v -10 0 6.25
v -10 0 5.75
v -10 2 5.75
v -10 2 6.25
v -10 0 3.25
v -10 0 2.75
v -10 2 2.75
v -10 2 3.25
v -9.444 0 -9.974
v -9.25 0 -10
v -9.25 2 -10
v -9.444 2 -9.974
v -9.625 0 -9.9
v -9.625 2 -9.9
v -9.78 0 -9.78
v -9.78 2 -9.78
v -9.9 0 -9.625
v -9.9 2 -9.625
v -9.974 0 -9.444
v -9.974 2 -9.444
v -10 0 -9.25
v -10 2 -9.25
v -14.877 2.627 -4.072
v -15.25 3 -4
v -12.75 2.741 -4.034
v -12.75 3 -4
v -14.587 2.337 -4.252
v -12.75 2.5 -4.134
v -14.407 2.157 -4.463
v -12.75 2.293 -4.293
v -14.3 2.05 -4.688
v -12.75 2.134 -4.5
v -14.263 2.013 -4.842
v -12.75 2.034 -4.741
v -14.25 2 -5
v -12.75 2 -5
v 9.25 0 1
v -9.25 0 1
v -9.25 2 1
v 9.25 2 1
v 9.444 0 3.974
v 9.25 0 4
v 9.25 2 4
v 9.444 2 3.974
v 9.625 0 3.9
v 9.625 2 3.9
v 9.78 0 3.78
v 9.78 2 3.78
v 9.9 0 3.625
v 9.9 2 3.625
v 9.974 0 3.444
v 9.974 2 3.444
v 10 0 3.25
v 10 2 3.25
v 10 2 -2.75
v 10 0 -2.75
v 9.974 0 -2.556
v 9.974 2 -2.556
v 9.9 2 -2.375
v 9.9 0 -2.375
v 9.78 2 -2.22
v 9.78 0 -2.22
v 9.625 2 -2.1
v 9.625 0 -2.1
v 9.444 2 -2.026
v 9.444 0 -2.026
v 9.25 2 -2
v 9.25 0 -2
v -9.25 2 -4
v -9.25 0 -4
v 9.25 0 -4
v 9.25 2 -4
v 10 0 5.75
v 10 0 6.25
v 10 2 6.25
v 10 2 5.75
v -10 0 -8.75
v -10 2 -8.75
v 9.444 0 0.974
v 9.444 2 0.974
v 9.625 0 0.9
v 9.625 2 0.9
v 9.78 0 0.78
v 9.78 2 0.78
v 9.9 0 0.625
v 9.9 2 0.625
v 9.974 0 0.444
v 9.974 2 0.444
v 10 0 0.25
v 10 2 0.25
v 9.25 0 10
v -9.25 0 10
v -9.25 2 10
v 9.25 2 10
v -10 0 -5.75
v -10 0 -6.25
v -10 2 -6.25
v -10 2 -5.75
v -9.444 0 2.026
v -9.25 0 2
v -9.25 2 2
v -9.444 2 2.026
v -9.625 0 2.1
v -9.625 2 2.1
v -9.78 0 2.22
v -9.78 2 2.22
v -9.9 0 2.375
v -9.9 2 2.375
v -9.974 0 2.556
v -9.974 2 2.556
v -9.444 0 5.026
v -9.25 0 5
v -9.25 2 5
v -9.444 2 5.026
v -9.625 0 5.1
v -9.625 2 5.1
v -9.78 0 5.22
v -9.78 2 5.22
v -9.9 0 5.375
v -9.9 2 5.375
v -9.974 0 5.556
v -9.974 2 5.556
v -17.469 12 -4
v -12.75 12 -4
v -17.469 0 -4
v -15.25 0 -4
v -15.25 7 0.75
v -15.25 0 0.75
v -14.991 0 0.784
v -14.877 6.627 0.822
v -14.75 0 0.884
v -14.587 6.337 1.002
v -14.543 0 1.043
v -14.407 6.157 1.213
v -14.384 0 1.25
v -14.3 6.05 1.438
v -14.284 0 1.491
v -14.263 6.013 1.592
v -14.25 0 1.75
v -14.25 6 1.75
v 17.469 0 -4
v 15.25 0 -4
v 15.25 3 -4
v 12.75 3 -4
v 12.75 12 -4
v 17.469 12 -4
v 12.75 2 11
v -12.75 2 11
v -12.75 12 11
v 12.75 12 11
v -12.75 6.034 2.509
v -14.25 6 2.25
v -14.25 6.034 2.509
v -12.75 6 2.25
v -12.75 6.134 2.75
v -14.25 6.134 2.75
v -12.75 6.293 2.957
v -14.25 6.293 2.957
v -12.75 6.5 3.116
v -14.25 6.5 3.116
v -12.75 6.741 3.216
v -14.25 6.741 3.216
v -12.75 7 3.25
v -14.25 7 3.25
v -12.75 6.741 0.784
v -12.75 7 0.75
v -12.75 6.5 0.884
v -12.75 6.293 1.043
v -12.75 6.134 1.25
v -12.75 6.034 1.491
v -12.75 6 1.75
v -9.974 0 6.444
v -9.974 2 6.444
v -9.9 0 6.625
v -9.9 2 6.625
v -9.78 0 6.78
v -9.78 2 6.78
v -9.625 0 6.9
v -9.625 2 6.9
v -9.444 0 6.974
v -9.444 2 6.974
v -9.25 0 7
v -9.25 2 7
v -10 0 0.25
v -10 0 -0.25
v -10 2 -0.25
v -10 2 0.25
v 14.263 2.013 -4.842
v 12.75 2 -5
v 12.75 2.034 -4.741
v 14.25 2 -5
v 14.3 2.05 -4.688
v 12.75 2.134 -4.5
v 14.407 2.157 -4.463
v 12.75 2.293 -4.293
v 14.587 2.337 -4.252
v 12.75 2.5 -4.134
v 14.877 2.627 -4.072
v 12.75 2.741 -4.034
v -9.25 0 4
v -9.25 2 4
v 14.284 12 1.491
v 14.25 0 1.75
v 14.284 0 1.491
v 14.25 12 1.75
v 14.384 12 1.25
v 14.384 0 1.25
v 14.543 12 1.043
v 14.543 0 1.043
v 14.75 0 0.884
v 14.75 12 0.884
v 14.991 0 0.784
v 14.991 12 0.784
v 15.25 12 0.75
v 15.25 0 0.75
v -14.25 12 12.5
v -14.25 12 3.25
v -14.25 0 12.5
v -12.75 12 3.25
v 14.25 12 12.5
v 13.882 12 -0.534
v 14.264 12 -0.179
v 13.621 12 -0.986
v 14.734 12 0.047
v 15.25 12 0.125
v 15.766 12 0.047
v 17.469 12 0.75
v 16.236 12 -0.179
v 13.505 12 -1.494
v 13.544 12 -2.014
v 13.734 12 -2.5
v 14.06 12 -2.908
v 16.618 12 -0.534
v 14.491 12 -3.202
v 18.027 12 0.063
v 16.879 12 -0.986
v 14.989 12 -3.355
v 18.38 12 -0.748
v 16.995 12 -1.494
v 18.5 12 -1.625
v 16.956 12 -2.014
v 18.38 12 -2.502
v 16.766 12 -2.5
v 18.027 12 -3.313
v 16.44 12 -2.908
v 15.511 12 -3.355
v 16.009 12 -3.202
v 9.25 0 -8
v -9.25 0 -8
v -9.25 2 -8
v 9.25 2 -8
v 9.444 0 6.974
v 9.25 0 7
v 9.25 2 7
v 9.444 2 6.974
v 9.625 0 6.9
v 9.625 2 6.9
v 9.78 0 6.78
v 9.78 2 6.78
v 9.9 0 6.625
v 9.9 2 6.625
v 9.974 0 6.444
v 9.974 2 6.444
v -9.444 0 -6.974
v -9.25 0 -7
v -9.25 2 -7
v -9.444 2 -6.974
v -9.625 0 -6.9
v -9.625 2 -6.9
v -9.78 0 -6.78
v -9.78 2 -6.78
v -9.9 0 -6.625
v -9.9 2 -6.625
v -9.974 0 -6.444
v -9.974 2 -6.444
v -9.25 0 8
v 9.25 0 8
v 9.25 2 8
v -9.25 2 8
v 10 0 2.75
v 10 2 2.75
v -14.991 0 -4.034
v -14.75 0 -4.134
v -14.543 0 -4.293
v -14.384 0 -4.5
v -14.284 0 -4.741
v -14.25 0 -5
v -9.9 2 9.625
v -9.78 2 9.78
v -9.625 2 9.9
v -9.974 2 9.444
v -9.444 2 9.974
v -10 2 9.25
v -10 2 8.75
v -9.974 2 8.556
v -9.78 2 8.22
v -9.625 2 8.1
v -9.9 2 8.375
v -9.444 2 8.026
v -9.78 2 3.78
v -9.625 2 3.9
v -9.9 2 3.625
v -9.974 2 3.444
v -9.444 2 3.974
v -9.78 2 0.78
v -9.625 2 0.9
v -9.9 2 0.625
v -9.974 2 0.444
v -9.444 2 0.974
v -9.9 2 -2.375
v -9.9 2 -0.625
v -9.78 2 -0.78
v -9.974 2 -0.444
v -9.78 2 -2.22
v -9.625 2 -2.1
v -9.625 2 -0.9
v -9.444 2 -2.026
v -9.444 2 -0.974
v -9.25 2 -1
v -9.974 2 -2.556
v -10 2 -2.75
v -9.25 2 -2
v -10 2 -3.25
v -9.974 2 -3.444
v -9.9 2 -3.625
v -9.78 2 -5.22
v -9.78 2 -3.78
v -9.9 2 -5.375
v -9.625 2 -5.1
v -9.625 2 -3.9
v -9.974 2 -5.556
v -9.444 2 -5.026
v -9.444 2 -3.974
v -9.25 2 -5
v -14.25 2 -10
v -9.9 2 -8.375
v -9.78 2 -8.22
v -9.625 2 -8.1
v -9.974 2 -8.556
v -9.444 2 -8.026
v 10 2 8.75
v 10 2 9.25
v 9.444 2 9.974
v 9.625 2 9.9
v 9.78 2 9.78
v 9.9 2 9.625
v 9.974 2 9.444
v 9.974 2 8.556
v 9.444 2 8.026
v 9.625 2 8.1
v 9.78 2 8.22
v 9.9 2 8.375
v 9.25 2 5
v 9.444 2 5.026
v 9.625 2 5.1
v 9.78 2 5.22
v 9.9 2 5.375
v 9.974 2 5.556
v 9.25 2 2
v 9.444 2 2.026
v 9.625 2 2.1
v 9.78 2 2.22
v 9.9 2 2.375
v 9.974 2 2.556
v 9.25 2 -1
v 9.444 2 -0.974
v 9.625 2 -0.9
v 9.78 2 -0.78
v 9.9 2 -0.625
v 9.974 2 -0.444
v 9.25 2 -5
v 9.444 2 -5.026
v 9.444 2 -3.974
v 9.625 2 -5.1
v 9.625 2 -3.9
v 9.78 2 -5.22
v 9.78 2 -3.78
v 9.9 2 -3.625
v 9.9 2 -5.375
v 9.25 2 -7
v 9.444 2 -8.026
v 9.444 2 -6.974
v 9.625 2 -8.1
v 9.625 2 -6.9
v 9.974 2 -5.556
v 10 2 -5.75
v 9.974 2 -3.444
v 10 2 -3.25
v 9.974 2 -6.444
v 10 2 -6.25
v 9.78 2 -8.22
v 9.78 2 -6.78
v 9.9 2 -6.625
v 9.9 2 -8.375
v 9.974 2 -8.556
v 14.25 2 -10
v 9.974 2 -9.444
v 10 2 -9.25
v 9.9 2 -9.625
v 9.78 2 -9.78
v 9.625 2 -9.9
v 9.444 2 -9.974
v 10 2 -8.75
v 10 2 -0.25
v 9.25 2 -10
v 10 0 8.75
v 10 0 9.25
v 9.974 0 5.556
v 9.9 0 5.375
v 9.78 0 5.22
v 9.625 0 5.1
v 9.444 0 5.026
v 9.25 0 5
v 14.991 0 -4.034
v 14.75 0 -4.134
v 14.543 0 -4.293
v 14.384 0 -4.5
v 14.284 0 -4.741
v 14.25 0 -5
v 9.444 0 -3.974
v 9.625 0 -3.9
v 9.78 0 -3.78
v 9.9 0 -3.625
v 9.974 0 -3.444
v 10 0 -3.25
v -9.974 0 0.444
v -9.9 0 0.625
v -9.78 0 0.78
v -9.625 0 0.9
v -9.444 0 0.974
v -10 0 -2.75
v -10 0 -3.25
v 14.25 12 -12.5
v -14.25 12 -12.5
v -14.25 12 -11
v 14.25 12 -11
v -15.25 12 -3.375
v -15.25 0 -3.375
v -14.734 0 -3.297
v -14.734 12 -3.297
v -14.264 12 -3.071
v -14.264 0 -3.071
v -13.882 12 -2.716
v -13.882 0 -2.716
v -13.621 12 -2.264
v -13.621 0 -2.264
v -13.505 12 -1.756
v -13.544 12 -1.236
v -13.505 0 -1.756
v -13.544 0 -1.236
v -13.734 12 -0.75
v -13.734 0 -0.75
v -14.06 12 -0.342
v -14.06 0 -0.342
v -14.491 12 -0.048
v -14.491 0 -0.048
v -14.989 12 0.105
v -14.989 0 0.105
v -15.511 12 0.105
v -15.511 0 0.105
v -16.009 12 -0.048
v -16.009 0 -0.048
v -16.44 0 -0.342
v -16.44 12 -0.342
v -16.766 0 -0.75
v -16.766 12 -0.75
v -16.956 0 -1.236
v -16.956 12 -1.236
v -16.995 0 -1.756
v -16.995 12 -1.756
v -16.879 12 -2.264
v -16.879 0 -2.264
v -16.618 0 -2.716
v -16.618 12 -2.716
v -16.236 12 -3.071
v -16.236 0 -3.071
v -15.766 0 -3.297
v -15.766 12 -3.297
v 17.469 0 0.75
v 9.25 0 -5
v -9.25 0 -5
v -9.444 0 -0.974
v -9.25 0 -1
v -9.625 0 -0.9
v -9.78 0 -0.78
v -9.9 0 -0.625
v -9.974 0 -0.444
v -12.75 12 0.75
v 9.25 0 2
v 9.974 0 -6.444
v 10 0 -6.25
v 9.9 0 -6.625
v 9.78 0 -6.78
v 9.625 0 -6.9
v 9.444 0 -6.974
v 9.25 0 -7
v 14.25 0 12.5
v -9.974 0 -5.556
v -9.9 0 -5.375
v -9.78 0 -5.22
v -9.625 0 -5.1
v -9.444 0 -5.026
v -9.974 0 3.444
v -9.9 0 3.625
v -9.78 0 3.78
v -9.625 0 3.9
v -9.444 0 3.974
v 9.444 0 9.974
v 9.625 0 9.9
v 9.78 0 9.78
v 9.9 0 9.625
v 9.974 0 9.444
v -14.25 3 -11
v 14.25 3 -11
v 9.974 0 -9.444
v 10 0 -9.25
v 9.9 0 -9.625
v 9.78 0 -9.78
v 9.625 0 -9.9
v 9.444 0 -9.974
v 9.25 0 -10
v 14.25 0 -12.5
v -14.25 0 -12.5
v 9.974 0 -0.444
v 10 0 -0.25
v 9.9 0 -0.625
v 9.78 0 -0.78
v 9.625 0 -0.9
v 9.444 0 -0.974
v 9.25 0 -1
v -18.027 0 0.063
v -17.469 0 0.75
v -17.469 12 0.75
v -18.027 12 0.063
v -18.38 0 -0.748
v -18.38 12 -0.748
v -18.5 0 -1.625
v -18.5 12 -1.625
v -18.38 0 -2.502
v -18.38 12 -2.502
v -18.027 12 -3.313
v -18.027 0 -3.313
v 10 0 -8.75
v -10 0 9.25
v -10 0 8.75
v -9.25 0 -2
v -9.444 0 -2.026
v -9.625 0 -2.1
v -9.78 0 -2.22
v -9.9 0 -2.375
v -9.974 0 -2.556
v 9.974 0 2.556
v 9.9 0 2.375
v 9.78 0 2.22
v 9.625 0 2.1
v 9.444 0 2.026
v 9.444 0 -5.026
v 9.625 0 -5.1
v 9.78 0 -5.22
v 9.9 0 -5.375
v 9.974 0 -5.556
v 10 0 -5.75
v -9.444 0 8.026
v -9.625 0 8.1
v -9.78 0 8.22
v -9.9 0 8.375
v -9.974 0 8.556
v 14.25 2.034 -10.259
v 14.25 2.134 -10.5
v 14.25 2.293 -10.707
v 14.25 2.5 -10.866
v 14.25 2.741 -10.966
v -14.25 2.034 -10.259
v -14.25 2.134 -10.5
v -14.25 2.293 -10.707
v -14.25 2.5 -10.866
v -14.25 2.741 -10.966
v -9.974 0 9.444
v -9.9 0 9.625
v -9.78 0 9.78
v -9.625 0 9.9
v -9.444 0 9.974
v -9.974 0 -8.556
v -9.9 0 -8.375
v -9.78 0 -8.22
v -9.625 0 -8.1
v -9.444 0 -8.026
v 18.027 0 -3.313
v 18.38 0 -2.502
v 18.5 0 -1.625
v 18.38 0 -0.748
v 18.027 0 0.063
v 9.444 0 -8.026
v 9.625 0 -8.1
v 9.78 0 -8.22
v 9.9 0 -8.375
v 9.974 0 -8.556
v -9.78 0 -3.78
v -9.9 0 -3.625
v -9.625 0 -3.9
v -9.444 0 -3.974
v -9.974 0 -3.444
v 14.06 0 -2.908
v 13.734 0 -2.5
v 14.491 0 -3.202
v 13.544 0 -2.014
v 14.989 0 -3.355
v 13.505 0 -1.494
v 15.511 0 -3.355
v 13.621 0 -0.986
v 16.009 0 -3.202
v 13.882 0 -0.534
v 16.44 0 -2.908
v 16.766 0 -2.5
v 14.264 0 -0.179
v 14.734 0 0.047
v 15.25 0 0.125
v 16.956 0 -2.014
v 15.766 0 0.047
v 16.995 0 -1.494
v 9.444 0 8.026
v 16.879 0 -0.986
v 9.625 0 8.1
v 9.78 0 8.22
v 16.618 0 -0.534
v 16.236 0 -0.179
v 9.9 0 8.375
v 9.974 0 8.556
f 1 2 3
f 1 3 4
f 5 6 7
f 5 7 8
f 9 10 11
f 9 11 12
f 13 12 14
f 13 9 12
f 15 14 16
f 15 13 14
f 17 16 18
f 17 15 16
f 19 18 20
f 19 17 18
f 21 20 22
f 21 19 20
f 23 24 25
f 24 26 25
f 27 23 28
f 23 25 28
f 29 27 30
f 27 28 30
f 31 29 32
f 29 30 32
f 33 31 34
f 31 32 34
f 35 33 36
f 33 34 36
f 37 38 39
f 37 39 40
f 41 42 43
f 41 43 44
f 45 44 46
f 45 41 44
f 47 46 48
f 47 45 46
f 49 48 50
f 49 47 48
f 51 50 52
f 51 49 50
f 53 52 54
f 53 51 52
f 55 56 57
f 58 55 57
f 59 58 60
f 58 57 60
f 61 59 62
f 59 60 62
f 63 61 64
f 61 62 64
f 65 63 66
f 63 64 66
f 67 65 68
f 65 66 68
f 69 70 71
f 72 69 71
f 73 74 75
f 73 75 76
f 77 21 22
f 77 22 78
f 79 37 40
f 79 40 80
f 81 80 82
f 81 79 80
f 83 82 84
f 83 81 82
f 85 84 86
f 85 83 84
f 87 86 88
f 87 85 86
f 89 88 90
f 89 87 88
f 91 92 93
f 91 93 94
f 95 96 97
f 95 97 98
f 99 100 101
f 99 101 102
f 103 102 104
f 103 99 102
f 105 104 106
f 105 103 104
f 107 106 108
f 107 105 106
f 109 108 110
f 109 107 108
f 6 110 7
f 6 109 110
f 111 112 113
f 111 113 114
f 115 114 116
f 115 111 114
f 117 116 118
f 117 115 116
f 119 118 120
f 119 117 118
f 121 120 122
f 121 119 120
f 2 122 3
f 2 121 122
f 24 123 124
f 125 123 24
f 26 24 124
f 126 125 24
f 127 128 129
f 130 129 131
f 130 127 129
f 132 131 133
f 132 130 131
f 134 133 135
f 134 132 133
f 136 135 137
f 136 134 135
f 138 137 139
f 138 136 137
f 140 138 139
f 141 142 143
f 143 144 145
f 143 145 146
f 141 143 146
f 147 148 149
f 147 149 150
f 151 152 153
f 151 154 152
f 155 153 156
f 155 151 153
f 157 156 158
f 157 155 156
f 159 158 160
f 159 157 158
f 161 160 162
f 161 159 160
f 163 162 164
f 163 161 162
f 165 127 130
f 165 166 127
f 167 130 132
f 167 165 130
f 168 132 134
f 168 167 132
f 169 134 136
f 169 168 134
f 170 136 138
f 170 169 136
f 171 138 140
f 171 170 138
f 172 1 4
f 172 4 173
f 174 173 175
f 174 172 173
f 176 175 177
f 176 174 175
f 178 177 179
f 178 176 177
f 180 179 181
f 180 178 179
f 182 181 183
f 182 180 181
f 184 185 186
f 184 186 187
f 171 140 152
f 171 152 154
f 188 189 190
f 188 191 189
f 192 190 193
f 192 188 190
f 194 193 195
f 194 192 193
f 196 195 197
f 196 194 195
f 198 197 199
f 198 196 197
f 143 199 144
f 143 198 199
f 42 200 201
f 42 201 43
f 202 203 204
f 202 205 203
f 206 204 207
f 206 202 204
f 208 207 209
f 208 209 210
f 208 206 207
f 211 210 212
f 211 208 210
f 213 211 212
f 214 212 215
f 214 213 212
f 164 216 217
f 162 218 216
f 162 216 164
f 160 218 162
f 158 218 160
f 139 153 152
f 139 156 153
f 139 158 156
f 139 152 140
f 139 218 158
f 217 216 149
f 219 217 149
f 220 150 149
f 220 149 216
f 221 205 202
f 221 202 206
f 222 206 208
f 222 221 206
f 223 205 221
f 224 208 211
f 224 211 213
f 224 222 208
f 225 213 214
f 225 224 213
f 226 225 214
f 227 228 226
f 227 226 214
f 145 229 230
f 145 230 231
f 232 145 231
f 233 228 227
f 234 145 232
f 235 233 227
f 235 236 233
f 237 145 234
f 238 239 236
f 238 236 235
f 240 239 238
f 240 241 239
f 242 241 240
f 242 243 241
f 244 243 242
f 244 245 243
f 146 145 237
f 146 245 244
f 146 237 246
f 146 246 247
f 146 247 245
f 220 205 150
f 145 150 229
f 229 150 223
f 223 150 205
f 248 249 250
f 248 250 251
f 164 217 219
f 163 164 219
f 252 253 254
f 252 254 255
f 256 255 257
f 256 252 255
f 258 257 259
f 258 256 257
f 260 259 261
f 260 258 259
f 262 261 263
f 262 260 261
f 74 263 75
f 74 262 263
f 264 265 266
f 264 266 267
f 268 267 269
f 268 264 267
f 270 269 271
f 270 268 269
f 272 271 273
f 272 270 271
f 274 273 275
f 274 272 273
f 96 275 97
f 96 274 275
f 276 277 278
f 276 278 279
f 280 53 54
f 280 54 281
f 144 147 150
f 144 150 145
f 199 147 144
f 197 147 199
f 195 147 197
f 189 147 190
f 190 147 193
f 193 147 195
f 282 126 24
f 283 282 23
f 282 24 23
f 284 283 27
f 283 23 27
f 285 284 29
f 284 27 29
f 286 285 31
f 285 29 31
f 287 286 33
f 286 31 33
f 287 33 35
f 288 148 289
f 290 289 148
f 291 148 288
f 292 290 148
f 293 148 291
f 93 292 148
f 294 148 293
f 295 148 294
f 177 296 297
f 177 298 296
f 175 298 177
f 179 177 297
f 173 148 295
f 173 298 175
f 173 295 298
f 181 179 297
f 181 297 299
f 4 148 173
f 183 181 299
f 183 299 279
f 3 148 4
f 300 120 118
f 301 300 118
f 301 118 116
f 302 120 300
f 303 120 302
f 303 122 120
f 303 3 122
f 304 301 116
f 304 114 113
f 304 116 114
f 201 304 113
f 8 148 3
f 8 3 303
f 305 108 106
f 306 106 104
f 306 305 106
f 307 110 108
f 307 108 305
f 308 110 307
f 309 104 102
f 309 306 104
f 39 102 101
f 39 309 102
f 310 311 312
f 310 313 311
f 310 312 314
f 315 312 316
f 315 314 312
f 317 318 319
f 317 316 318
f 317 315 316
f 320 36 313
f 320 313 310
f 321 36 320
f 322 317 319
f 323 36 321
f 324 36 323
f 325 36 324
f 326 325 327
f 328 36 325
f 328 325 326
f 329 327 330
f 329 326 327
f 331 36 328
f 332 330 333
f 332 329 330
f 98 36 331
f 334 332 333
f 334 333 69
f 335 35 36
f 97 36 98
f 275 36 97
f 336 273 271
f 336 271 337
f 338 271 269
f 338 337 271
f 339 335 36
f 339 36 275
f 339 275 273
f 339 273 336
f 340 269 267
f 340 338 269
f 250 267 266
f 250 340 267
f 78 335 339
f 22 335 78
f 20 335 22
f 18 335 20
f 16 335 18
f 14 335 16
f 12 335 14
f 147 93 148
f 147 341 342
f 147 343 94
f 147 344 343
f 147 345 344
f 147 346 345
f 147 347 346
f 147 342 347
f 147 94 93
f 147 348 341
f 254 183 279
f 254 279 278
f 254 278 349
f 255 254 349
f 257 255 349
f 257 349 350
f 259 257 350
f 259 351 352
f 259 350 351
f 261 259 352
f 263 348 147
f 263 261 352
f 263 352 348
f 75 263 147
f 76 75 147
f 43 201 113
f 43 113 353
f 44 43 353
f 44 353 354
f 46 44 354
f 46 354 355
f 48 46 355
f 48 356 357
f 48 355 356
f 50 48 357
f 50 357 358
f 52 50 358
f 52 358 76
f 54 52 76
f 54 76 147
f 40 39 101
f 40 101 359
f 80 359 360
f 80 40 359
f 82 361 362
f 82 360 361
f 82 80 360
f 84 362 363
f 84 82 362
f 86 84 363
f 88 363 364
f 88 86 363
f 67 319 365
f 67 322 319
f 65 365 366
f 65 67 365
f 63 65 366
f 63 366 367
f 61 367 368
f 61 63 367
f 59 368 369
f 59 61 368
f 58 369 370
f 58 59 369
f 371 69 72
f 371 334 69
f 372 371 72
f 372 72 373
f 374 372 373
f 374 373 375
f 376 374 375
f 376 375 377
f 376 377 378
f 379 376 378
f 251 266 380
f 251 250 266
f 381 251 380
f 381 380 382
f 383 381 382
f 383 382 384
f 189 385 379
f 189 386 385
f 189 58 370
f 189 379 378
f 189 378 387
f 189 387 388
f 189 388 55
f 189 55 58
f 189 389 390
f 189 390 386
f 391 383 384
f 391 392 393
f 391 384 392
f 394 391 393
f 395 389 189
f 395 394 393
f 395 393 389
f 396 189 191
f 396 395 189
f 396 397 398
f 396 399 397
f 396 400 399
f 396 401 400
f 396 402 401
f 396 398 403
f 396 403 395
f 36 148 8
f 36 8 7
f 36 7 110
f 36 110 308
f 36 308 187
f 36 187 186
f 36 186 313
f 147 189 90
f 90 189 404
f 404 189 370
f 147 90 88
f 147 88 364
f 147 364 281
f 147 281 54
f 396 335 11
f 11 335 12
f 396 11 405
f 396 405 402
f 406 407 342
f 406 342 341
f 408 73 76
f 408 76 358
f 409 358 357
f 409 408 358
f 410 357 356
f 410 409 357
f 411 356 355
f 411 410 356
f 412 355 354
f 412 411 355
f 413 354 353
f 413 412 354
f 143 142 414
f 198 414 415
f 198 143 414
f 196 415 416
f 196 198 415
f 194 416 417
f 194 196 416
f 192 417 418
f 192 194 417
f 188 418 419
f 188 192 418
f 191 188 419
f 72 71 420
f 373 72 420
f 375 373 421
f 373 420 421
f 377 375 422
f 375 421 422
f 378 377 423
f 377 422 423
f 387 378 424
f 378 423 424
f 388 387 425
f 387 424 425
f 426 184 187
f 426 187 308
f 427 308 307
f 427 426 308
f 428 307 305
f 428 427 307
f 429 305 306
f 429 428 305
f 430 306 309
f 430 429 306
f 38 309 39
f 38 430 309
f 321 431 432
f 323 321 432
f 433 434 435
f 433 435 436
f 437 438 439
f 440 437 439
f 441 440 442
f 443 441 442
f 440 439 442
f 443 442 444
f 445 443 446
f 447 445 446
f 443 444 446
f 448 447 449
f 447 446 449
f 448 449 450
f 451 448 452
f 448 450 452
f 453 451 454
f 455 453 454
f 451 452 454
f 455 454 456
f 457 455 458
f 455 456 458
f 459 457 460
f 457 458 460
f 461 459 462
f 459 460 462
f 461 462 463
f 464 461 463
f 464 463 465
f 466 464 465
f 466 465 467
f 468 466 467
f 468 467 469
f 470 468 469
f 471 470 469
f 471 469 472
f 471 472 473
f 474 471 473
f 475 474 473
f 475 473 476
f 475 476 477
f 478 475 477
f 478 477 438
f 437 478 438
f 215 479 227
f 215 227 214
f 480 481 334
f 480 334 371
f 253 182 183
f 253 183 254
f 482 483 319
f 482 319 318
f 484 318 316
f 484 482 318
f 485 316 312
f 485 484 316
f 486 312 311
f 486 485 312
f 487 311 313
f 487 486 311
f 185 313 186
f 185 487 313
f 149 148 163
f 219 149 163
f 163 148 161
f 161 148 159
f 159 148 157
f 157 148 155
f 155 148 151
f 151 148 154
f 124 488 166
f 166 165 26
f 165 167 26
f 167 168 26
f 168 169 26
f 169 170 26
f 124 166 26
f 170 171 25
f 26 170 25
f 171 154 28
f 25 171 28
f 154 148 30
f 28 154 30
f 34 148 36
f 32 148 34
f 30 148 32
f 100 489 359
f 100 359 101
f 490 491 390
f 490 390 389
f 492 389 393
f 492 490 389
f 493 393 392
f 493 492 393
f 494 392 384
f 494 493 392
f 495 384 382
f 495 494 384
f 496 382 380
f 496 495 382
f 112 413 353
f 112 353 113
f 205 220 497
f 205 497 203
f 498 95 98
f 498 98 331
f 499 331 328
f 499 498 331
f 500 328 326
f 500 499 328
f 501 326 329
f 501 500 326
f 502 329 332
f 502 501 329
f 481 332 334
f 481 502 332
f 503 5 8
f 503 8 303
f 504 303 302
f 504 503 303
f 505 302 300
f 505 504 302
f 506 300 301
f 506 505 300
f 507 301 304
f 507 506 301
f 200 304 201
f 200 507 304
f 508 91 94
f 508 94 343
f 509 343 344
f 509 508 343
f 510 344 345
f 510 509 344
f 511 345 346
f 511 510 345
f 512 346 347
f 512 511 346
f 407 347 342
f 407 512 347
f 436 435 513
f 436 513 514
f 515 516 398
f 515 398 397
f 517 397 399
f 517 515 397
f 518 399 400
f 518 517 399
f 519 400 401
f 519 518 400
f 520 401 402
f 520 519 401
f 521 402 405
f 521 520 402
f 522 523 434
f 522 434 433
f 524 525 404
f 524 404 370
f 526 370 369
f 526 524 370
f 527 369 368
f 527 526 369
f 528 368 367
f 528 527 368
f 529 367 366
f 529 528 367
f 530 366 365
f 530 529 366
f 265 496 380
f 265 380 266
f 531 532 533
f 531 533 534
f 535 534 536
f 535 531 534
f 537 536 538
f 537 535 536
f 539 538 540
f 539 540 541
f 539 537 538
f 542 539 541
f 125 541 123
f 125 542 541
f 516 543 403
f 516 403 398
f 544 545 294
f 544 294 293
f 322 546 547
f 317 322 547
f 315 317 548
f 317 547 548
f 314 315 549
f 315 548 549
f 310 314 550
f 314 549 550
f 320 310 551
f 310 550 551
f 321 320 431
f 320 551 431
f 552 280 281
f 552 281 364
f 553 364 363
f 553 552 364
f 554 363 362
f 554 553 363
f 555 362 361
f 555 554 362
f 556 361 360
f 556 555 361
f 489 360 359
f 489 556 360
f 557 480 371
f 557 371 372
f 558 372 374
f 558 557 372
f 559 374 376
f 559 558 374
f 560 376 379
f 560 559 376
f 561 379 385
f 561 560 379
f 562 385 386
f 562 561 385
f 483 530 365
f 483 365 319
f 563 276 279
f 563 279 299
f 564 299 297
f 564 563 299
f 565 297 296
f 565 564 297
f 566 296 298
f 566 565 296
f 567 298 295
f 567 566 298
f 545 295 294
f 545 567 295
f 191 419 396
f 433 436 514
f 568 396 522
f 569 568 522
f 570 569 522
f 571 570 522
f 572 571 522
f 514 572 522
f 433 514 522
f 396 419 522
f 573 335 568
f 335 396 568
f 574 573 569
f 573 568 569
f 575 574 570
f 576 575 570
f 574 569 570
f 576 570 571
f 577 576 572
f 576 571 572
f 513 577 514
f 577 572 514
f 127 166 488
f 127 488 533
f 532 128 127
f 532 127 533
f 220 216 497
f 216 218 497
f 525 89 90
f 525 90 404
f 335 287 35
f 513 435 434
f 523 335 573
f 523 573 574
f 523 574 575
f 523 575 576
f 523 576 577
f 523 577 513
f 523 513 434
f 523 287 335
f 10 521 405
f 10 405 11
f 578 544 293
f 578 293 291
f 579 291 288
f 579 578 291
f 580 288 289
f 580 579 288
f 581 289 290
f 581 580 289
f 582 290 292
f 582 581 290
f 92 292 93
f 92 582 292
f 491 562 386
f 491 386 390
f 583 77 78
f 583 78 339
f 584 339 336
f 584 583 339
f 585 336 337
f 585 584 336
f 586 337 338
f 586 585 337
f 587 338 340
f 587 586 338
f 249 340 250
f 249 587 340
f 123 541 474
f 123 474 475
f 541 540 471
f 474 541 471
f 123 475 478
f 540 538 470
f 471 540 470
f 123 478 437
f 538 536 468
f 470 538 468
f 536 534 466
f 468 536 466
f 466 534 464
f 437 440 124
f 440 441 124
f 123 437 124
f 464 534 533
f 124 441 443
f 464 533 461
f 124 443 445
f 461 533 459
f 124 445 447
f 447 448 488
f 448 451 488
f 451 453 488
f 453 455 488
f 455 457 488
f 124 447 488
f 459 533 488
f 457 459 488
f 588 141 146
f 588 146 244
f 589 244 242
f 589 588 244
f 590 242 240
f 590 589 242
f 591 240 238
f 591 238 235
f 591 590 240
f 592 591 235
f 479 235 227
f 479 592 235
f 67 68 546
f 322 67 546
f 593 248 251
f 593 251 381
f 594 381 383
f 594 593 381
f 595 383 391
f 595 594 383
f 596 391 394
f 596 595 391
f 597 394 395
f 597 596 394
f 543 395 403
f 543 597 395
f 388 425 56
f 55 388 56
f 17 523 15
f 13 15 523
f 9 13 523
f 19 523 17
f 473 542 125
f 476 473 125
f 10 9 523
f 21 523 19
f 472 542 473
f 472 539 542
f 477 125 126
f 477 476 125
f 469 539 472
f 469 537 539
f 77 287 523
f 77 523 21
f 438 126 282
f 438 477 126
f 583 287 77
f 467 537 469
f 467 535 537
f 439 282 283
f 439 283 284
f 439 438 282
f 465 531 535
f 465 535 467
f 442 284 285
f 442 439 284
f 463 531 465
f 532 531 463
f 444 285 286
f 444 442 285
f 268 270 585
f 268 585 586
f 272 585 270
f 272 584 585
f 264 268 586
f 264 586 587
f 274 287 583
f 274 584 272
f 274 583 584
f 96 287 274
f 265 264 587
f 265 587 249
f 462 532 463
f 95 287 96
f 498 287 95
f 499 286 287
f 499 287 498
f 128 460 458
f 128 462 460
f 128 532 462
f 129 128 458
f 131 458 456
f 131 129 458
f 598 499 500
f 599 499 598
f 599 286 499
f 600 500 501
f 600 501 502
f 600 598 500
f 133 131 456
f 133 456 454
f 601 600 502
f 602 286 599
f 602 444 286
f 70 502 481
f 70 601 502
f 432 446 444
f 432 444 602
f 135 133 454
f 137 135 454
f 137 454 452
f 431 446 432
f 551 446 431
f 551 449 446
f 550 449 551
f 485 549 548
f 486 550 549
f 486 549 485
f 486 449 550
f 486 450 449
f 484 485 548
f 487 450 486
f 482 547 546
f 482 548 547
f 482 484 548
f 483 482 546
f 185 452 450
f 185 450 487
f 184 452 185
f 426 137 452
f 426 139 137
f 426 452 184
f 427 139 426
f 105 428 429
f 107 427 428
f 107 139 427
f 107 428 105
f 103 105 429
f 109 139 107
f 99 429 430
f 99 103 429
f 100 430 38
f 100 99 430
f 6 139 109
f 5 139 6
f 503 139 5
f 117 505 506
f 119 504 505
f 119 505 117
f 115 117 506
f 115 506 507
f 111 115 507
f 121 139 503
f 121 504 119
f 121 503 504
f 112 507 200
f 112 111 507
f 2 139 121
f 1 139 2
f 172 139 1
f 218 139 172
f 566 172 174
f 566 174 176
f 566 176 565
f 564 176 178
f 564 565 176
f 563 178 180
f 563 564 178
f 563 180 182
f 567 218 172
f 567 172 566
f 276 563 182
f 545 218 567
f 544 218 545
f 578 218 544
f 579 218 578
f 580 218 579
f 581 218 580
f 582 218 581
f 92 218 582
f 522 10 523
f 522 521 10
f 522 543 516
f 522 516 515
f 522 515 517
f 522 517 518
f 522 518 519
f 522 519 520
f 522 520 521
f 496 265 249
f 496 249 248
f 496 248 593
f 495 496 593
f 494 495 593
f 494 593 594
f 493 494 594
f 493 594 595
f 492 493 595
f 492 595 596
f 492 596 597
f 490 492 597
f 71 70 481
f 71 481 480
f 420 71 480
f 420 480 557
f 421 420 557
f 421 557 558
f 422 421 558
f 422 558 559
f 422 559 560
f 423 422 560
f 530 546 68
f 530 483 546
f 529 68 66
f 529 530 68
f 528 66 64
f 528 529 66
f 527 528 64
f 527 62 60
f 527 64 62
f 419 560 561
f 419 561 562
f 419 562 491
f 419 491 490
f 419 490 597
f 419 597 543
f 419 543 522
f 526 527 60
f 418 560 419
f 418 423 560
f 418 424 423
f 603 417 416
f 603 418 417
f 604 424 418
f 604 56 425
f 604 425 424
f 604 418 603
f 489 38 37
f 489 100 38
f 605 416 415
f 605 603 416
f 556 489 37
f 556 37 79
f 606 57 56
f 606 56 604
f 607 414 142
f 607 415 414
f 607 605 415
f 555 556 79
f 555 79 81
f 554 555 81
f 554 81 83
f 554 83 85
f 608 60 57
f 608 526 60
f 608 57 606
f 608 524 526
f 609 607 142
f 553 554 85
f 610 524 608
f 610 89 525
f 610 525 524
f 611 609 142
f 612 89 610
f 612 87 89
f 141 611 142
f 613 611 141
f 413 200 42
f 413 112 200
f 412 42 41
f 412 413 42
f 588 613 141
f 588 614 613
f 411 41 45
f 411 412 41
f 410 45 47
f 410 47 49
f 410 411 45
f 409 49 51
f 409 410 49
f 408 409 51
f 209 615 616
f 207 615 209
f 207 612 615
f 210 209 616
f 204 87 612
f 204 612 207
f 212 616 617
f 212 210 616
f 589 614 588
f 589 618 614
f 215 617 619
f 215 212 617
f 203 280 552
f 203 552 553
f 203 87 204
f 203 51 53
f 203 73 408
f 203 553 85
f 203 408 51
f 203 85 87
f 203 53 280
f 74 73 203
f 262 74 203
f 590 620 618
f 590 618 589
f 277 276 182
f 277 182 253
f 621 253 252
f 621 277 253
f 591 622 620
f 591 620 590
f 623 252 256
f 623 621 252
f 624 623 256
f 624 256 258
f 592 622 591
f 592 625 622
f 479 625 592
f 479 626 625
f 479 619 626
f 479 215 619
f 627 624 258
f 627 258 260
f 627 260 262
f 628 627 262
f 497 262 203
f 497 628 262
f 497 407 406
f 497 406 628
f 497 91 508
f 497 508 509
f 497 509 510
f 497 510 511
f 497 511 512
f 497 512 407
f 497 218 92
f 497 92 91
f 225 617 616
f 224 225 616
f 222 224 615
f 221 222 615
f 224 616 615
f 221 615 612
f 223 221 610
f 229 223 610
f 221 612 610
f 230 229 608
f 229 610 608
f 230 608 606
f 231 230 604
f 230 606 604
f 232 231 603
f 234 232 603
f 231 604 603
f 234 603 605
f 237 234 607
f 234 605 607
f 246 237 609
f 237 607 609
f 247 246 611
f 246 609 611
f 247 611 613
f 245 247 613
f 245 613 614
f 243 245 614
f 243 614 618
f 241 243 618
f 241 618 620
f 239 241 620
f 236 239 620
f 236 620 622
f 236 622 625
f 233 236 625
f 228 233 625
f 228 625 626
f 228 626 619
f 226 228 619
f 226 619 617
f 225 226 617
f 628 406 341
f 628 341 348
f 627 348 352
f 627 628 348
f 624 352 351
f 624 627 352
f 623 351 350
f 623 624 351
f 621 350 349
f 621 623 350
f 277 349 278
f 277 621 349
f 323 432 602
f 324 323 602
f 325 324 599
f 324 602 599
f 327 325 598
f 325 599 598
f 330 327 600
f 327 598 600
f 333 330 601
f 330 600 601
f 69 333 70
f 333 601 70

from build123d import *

# Parameters (mm, degrees)
SKETCH1_W           = 28.5
SKETCH1_H           = 25
BOSS_EXTRUDE1_DEPTH = 2
SKETCH2_W           = 28.5
SKETCH2_H           = 25
SKETCH2_W_2         = 25.5
SKETCH2_H_2         = 22
BOSS_EXTRUDE2_DEPTH = 10
SKETCH3_W           = 1.5
SKETCH3_H           = 7
CUT_EXTRUDE1_DEPTH  = 10
SKETCH4_W           = 1.5
SKETCH4_H           = 2.5
CUT_EXTRUDE2_DEPTH  = 6
BOSS_EXTRUDE3_DEPTH = 12
CUT_EXTRUDE3_REACH  = 27.348
SKETCH6_R           = 1.75
FILLET1_R           = 1


with BuildPart() as part:
    # Sketch1 → Boss-Extrude1 (new body)
    with BuildSketch(Plane(origin=(0, 0, 0), x_dir=(1, 0, 0), z_dir=(0, 1, 0))):
        Rectangle(SKETCH1_W, SKETCH1_H)
        with BuildLine():
            Line((-9.25, 5), (9.25, 5))
            ThreePointArc((9.25, 5), (9.780330086, 5.219669914), (10, 5.75))
            Line((10, 5.75), (10, 6.25))
            ThreePointArc((10, 6.25), (9.780330086, 6.780330086), (9.25, 7))
            Line((9.25, 7), (-9.25, 7))
            ThreePointArc((-9.25, 7), (-9.780330086, 6.780330086), (-10, 6.25))
            Line((-10, 6.25), (-10, 5.75))
            ThreePointArc((-10, 5.75), (-9.780330086, 5.219669914), (-9.25, 5))
        make_face(mode=Mode.SUBTRACT)
        with BuildLine():
            Line((-9.25, 4), (9.25, 4))
            ThreePointArc((9.25, 4), (9.780330086, 3.780330086), (10, 3.25))
            Line((10, 3.25), (10, 2.75))
            ThreePointArc((10, 2.75), (9.780330086, 2.219669914), (9.25, 2))
            Line((9.25, 2), (-9.25, 2))
            ThreePointArc((-9.25, 2), (-9.780330086, 2.219669914), (-10, 2.75))
            Line((-10, 2.75), (-10, 3.25))
            ThreePointArc((-10, 3.25), (-9.780330086, 3.780330086), (-9.25, 4))
        make_face(mode=Mode.SUBTRACT)
        with BuildLine():
            Line((-9.25, 8), (9.25, 8))
            ThreePointArc((9.25, 8), (9.780330086, 8.219669914), (10, 8.75))
            Line((10, 8.75), (10, 9.25))
            ThreePointArc((10, 9.25), (9.780330086, 9.780330086), (9.25, 10))
            Line((9.25, 10), (-9.25, 10))
            ThreePointArc((-9.25, 10), (-9.780330086, 9.780330086), (-10, 9.25))
            Line((-10, 9.25), (-10, 8.75))
            ThreePointArc((-10, 8.75), (-9.780330086, 8.219669914), (-9.25, 8))
        make_face(mode=Mode.SUBTRACT)
        with BuildLine():
            Line((10, -9.25), (10, -8.75))
            ThreePointArc((10, -8.75), (9.780330086, -8.219669914), (9.25, -8))
            Line((9.25, -8), (-9.25, -8))
            ThreePointArc((-9.25, -8), (-9.780330086, -8.219669914), (-10, -8.75))
            Line((-10, -8.75), (-10, -9.25))
            ThreePointArc((-10, -9.25), (-9.780330086, -9.780330086), (-9.25, -10))
            Line((-9.25, -10), (9.25, -10))
            ThreePointArc((9.25, -10), (9.780330086, -9.780330086), (10, -9.25))
        make_face(mode=Mode.SUBTRACT)
        with BuildLine():
            Line((10, -6.25), (10, -5.75))
            ThreePointArc((10, -5.75), (9.780330086, -5.219669914), (9.25, -5))
            Line((9.25, -5), (-9.25, -5))
            ThreePointArc((-9.25, -5), (-9.780330086, -5.219669914), (-10, -5.75))
            Line((-10, -5.75), (-10, -6.25))
            ThreePointArc((-10, -6.25), (-9.780330086, -6.780330086), (-9.25, -7))
            Line((-9.25, -7), (9.25, -7))
            ThreePointArc((9.25, -7), (9.780330086, -6.780330086), (10, -6.25))
        make_face(mode=Mode.SUBTRACT)
        with BuildLine():
            Line((10, -3.25), (10, -2.75))
            ThreePointArc((10, -2.75), (9.780330086, -2.219669914), (9.25, -2))
            Line((9.25, -2), (-9.25, -2))
            ThreePointArc((-9.25, -2), (-9.780330086, -2.219669914), (-10, -2.75))
            Line((-10, -2.75), (-10, -3.25))
            ThreePointArc((-10, -3.25), (-9.780330086, -3.780330086), (-9.25, -4))
            Line((-9.25, -4), (9.25, -4))
            ThreePointArc((9.25, -4), (9.780330086, -3.780330086), (10, -3.25))
        make_face(mode=Mode.SUBTRACT)
        with BuildLine():
            Line((-10, 0.25), (-10, -0.25))
            ThreePointArc((-10, -0.25), (-9.780330086, -0.780330086), (-9.25, -1))
            Line((-9.25, -1), (9.25, -1))
            ThreePointArc((9.25, -1), (9.780330086, -0.780330086), (10, -0.25))
            Line((10, -0.25), (10, 0.25))
            ThreePointArc((10, 0.25), (9.780330086, 0.780330086), (9.25, 1))
            Line((9.25, 1), (-9.25, 1))
            ThreePointArc((-9.25, 1), (-9.780330086, 0.780330086), (-10, 0.25))
        make_face(mode=Mode.SUBTRACT)
    extrude(amount=BOSS_EXTRUDE1_DEPTH)

    # Sketch2 → Boss-Extrude2 (add)
    with BuildSketch(Plane(origin=(0, 2, 0), x_dir=(1, 0, 0), z_dir=(0, 1, 0))):
        Rectangle(SKETCH2_W, SKETCH2_H)
        Rectangle(SKETCH2_W_2, SKETCH2_H_2, mode=Mode.SUBTRACT)
    extrude(amount=BOSS_EXTRUDE2_DEPTH)

    # Sketch3 → Cut-Extrude1 (cut)
    with BuildSketch(Plane(origin=(0, 12, 0), x_dir=(1, 0, 0), z_dir=(0, 1, 0))):
        with Locations((-13.5, 7.5)):
            Rectangle(SKETCH3_W, SKETCH3_H)
        with Locations((13.5, 7.5)):
            Rectangle(SKETCH3_W, SKETCH3_H)
    extrude(amount=-CUT_EXTRUDE1_DEPTH, mode=Mode.SUBTRACT)

    # Sketch4 → Cut-Extrude2 (cut)
    with BuildSketch(Plane(origin=(0, 12, 0), x_dir=(1, 0, 0), z_dir=(0, 1, 0))):
        with Locations((-13.5, -2)):
            Rectangle(SKETCH4_W, SKETCH4_H)
    extrude(amount=-CUT_EXTRUDE2_DEPTH, mode=Mode.SUBTRACT)

    # Sketch5 → Boss-Extrude3 (add)
    with BuildSketch(Plane.XZ):
        with BuildLine():
            Line((-17.468529919, -4), (-14.25, -4))
            Line((-14.25, -4), (-14.25, 0.75))
            Line((-14.25, 0.75), (-17.468529919, 0.75))
            ThreePointArc((-17.468529919, 0.75), (-18.5, -1.625), (-17.468529919, -4))
        make_face()
        with BuildLine():
            Line((14.25, 0.75), (14.25, -4))
            Line((14.25, -4), (17.468529919, -4))
            ThreePointArc((17.468529919, -4), (18.5, -1.625), (17.468529919, 0.75))
            Line((17.468529919, 0.75), (14.25, 0.75))
        make_face()
    extrude(amount=-BOSS_EXTRUDE3_DEPTH)

    # Sketch6 → Cut-Extrude3 (cut, up to next)
    with BuildSketch(Plane.XZ, mode=Mode.PRIVATE) as cut_extrude3_sk1:
        with Locations(Location((-15.25, -1.625, 0), (0, 0, 270))):
            Circle(SKETCH6_R)
    cut_extrude3_tool1 = extrude(cut_extrude3_sk1.sketch, amount=-CUT_EXTRUDE3_REACH, mode=Mode.PRIVATE) & part.part
    # Sketch6 → Cut-Extrude3 (cut, up to next)
    with BuildSketch(Plane.XZ, mode=Mode.PRIVATE) as cut_extrude3_sk2:
        with Locations(Location((15.25, -1.625, 0), (0, 0, 90))):
            Circle(SKETCH6_R)
    cut_extrude3_tool2 = extrude(cut_extrude3_sk2.sketch, amount=-CUT_EXTRUDE3_REACH, mode=Mode.PRIVATE) & part.part
    add(cut_extrude3_tool1.solids().sort_by_distance((-15.25, 0, -1.625))[0], mode=Mode.SUBTRACT)
    add(cut_extrude3_tool2.solids().sort_by_distance((15.25, 0, -1.625))[0], mode=Mode.SUBTRACT)

    # Fillet1
    fillet1_edges = [part.edges().sort_by_distance(p)[0] for p in [
        (-14.25, 1, -4),
        (14.25, 1, -4),
        (-14.25, 3, 0.75),
        (14.25, 6, 0.75),
        (-13.5, 6, 0.75),
        (-13.5, 6, 3.25),
        (13.5, 2, -4),
        (-13.5, 2, -4),
        (0, 2, -11),
    ]]
    fillet(fillet1_edges, radius=FILLET1_R - 0.0001)  # a hair under: the kernel refuses the full size


solid = part.part
